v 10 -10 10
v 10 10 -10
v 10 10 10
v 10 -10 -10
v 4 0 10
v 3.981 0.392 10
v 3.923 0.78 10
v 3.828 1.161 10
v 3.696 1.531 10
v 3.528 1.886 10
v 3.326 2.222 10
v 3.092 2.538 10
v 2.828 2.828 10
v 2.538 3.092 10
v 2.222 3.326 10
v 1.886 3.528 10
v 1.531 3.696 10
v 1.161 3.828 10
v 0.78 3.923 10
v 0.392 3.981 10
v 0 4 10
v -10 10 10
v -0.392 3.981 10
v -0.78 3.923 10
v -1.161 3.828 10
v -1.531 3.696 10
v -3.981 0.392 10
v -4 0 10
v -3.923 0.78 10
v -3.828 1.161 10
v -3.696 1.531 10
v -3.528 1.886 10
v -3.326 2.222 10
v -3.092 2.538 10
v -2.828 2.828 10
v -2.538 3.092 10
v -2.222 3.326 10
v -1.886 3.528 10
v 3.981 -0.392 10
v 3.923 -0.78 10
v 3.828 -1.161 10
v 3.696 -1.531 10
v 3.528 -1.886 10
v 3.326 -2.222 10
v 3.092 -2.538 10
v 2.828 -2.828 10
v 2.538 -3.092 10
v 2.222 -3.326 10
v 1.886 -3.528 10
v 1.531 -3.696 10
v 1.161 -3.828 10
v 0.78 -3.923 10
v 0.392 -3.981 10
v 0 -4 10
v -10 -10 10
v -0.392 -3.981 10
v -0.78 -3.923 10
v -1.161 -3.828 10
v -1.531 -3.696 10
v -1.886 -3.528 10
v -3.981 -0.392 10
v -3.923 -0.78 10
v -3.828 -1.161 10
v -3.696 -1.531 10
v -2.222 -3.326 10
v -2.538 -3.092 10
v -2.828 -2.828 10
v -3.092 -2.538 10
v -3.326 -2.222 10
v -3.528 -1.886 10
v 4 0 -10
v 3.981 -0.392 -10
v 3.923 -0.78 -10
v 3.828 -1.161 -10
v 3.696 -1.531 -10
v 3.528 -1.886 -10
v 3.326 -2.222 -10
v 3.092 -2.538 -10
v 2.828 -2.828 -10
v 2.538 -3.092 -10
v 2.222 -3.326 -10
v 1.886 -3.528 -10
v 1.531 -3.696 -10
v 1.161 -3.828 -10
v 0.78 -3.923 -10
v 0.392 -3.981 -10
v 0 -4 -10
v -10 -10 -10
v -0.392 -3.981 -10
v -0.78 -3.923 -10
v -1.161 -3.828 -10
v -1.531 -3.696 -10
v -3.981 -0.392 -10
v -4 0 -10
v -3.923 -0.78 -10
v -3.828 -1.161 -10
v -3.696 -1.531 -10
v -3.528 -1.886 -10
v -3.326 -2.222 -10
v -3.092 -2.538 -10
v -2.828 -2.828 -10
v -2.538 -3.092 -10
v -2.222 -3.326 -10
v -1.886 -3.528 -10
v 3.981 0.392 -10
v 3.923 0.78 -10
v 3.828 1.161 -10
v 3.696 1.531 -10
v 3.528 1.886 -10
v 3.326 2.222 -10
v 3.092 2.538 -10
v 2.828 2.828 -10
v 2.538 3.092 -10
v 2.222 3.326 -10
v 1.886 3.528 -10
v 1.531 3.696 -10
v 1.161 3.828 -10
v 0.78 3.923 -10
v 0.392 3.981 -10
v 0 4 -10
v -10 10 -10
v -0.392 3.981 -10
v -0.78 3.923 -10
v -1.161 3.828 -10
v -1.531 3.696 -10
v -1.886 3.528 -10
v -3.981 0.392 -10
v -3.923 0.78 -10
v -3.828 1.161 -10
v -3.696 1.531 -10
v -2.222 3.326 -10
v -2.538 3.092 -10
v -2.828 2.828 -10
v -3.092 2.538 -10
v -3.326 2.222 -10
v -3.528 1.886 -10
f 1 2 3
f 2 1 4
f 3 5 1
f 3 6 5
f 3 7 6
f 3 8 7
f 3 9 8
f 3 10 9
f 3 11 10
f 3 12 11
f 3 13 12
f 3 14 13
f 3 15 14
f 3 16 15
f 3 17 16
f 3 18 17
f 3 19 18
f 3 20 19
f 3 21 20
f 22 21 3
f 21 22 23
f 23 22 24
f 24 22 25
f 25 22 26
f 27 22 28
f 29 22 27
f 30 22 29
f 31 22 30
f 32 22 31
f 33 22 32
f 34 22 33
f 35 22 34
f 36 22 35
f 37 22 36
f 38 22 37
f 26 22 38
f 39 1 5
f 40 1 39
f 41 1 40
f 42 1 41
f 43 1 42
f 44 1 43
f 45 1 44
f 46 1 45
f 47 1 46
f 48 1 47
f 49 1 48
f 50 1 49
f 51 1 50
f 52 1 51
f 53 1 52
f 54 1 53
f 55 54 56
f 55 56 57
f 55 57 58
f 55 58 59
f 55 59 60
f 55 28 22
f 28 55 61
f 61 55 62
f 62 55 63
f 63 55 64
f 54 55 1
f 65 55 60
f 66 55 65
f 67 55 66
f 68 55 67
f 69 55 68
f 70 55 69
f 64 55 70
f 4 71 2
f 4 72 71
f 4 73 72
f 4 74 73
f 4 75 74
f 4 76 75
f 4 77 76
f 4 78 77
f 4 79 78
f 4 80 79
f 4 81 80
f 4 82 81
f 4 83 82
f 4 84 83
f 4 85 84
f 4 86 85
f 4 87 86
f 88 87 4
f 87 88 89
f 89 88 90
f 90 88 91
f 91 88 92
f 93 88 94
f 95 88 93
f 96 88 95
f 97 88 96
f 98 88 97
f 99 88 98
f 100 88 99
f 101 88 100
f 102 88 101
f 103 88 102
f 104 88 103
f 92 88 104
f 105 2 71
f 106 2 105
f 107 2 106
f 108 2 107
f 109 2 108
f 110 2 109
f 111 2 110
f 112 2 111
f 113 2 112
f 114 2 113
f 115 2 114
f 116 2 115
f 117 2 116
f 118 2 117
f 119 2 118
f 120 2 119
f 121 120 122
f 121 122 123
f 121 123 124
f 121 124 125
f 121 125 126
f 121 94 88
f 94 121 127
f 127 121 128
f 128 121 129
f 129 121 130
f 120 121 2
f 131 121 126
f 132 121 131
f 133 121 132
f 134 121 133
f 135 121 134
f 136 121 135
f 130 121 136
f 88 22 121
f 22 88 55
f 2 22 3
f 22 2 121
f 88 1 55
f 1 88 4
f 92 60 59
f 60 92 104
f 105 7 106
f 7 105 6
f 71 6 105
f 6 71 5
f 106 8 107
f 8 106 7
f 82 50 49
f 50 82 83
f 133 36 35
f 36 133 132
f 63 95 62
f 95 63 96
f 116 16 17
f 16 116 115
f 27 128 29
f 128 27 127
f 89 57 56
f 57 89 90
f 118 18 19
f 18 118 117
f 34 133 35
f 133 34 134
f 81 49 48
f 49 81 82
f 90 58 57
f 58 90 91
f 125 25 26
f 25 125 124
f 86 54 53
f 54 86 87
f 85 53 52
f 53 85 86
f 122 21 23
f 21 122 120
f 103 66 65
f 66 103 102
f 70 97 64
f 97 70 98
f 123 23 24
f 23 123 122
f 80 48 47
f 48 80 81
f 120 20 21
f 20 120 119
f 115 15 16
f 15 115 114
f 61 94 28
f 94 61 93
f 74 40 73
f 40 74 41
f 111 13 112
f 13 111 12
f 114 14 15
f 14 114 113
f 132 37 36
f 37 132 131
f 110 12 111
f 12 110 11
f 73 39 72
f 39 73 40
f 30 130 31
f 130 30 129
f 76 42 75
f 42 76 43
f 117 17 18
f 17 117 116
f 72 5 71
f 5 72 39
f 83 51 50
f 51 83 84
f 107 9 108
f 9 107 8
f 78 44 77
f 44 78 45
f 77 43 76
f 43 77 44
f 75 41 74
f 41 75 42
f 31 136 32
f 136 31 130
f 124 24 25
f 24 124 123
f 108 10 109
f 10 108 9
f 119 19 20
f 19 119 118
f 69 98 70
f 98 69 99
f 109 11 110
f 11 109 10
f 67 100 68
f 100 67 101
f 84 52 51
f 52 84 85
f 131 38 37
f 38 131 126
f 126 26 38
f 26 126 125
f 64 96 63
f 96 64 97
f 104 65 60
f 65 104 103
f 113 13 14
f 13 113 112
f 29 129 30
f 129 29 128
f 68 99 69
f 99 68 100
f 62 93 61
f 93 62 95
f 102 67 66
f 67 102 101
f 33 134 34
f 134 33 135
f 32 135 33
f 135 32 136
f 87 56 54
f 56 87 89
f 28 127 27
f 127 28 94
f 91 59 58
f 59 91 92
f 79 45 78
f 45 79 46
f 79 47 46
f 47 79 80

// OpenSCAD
// ============ PIEZA EN BLANCO ============
// Escribí aquí tu propio código OpenSCAD o pegá
// uno existente.
//
// Las variables definidas al inicio aparecen
// automáticamente en el panel PARÁMETROS:
//   ancho = 20;      // [5:50]      → deslizador
//   tipo = 2;        // [1,2,3]     → lista
//   con_tapa = true;               → casilla
//   /* [Grupo] */                  → título de grupo
//   /* [Hidden] */                 → oculta lo que sigue

/* [Dimensiones] */
// Lado del cubo (mm)
lado = 20; // [5:60]
// Diámetro del agujero (mm)
agujero = 8; // [1:30]

/* [Calidad] */
// Resolución de las curvas
resolucion = 64; // [16:160]

/* [Hidden] */
$fn = resolucion;

difference() {
    cube([lado, lado, lado], center = true);
    cylinder(h = lado + 2, d = agujero, center = true);
}
